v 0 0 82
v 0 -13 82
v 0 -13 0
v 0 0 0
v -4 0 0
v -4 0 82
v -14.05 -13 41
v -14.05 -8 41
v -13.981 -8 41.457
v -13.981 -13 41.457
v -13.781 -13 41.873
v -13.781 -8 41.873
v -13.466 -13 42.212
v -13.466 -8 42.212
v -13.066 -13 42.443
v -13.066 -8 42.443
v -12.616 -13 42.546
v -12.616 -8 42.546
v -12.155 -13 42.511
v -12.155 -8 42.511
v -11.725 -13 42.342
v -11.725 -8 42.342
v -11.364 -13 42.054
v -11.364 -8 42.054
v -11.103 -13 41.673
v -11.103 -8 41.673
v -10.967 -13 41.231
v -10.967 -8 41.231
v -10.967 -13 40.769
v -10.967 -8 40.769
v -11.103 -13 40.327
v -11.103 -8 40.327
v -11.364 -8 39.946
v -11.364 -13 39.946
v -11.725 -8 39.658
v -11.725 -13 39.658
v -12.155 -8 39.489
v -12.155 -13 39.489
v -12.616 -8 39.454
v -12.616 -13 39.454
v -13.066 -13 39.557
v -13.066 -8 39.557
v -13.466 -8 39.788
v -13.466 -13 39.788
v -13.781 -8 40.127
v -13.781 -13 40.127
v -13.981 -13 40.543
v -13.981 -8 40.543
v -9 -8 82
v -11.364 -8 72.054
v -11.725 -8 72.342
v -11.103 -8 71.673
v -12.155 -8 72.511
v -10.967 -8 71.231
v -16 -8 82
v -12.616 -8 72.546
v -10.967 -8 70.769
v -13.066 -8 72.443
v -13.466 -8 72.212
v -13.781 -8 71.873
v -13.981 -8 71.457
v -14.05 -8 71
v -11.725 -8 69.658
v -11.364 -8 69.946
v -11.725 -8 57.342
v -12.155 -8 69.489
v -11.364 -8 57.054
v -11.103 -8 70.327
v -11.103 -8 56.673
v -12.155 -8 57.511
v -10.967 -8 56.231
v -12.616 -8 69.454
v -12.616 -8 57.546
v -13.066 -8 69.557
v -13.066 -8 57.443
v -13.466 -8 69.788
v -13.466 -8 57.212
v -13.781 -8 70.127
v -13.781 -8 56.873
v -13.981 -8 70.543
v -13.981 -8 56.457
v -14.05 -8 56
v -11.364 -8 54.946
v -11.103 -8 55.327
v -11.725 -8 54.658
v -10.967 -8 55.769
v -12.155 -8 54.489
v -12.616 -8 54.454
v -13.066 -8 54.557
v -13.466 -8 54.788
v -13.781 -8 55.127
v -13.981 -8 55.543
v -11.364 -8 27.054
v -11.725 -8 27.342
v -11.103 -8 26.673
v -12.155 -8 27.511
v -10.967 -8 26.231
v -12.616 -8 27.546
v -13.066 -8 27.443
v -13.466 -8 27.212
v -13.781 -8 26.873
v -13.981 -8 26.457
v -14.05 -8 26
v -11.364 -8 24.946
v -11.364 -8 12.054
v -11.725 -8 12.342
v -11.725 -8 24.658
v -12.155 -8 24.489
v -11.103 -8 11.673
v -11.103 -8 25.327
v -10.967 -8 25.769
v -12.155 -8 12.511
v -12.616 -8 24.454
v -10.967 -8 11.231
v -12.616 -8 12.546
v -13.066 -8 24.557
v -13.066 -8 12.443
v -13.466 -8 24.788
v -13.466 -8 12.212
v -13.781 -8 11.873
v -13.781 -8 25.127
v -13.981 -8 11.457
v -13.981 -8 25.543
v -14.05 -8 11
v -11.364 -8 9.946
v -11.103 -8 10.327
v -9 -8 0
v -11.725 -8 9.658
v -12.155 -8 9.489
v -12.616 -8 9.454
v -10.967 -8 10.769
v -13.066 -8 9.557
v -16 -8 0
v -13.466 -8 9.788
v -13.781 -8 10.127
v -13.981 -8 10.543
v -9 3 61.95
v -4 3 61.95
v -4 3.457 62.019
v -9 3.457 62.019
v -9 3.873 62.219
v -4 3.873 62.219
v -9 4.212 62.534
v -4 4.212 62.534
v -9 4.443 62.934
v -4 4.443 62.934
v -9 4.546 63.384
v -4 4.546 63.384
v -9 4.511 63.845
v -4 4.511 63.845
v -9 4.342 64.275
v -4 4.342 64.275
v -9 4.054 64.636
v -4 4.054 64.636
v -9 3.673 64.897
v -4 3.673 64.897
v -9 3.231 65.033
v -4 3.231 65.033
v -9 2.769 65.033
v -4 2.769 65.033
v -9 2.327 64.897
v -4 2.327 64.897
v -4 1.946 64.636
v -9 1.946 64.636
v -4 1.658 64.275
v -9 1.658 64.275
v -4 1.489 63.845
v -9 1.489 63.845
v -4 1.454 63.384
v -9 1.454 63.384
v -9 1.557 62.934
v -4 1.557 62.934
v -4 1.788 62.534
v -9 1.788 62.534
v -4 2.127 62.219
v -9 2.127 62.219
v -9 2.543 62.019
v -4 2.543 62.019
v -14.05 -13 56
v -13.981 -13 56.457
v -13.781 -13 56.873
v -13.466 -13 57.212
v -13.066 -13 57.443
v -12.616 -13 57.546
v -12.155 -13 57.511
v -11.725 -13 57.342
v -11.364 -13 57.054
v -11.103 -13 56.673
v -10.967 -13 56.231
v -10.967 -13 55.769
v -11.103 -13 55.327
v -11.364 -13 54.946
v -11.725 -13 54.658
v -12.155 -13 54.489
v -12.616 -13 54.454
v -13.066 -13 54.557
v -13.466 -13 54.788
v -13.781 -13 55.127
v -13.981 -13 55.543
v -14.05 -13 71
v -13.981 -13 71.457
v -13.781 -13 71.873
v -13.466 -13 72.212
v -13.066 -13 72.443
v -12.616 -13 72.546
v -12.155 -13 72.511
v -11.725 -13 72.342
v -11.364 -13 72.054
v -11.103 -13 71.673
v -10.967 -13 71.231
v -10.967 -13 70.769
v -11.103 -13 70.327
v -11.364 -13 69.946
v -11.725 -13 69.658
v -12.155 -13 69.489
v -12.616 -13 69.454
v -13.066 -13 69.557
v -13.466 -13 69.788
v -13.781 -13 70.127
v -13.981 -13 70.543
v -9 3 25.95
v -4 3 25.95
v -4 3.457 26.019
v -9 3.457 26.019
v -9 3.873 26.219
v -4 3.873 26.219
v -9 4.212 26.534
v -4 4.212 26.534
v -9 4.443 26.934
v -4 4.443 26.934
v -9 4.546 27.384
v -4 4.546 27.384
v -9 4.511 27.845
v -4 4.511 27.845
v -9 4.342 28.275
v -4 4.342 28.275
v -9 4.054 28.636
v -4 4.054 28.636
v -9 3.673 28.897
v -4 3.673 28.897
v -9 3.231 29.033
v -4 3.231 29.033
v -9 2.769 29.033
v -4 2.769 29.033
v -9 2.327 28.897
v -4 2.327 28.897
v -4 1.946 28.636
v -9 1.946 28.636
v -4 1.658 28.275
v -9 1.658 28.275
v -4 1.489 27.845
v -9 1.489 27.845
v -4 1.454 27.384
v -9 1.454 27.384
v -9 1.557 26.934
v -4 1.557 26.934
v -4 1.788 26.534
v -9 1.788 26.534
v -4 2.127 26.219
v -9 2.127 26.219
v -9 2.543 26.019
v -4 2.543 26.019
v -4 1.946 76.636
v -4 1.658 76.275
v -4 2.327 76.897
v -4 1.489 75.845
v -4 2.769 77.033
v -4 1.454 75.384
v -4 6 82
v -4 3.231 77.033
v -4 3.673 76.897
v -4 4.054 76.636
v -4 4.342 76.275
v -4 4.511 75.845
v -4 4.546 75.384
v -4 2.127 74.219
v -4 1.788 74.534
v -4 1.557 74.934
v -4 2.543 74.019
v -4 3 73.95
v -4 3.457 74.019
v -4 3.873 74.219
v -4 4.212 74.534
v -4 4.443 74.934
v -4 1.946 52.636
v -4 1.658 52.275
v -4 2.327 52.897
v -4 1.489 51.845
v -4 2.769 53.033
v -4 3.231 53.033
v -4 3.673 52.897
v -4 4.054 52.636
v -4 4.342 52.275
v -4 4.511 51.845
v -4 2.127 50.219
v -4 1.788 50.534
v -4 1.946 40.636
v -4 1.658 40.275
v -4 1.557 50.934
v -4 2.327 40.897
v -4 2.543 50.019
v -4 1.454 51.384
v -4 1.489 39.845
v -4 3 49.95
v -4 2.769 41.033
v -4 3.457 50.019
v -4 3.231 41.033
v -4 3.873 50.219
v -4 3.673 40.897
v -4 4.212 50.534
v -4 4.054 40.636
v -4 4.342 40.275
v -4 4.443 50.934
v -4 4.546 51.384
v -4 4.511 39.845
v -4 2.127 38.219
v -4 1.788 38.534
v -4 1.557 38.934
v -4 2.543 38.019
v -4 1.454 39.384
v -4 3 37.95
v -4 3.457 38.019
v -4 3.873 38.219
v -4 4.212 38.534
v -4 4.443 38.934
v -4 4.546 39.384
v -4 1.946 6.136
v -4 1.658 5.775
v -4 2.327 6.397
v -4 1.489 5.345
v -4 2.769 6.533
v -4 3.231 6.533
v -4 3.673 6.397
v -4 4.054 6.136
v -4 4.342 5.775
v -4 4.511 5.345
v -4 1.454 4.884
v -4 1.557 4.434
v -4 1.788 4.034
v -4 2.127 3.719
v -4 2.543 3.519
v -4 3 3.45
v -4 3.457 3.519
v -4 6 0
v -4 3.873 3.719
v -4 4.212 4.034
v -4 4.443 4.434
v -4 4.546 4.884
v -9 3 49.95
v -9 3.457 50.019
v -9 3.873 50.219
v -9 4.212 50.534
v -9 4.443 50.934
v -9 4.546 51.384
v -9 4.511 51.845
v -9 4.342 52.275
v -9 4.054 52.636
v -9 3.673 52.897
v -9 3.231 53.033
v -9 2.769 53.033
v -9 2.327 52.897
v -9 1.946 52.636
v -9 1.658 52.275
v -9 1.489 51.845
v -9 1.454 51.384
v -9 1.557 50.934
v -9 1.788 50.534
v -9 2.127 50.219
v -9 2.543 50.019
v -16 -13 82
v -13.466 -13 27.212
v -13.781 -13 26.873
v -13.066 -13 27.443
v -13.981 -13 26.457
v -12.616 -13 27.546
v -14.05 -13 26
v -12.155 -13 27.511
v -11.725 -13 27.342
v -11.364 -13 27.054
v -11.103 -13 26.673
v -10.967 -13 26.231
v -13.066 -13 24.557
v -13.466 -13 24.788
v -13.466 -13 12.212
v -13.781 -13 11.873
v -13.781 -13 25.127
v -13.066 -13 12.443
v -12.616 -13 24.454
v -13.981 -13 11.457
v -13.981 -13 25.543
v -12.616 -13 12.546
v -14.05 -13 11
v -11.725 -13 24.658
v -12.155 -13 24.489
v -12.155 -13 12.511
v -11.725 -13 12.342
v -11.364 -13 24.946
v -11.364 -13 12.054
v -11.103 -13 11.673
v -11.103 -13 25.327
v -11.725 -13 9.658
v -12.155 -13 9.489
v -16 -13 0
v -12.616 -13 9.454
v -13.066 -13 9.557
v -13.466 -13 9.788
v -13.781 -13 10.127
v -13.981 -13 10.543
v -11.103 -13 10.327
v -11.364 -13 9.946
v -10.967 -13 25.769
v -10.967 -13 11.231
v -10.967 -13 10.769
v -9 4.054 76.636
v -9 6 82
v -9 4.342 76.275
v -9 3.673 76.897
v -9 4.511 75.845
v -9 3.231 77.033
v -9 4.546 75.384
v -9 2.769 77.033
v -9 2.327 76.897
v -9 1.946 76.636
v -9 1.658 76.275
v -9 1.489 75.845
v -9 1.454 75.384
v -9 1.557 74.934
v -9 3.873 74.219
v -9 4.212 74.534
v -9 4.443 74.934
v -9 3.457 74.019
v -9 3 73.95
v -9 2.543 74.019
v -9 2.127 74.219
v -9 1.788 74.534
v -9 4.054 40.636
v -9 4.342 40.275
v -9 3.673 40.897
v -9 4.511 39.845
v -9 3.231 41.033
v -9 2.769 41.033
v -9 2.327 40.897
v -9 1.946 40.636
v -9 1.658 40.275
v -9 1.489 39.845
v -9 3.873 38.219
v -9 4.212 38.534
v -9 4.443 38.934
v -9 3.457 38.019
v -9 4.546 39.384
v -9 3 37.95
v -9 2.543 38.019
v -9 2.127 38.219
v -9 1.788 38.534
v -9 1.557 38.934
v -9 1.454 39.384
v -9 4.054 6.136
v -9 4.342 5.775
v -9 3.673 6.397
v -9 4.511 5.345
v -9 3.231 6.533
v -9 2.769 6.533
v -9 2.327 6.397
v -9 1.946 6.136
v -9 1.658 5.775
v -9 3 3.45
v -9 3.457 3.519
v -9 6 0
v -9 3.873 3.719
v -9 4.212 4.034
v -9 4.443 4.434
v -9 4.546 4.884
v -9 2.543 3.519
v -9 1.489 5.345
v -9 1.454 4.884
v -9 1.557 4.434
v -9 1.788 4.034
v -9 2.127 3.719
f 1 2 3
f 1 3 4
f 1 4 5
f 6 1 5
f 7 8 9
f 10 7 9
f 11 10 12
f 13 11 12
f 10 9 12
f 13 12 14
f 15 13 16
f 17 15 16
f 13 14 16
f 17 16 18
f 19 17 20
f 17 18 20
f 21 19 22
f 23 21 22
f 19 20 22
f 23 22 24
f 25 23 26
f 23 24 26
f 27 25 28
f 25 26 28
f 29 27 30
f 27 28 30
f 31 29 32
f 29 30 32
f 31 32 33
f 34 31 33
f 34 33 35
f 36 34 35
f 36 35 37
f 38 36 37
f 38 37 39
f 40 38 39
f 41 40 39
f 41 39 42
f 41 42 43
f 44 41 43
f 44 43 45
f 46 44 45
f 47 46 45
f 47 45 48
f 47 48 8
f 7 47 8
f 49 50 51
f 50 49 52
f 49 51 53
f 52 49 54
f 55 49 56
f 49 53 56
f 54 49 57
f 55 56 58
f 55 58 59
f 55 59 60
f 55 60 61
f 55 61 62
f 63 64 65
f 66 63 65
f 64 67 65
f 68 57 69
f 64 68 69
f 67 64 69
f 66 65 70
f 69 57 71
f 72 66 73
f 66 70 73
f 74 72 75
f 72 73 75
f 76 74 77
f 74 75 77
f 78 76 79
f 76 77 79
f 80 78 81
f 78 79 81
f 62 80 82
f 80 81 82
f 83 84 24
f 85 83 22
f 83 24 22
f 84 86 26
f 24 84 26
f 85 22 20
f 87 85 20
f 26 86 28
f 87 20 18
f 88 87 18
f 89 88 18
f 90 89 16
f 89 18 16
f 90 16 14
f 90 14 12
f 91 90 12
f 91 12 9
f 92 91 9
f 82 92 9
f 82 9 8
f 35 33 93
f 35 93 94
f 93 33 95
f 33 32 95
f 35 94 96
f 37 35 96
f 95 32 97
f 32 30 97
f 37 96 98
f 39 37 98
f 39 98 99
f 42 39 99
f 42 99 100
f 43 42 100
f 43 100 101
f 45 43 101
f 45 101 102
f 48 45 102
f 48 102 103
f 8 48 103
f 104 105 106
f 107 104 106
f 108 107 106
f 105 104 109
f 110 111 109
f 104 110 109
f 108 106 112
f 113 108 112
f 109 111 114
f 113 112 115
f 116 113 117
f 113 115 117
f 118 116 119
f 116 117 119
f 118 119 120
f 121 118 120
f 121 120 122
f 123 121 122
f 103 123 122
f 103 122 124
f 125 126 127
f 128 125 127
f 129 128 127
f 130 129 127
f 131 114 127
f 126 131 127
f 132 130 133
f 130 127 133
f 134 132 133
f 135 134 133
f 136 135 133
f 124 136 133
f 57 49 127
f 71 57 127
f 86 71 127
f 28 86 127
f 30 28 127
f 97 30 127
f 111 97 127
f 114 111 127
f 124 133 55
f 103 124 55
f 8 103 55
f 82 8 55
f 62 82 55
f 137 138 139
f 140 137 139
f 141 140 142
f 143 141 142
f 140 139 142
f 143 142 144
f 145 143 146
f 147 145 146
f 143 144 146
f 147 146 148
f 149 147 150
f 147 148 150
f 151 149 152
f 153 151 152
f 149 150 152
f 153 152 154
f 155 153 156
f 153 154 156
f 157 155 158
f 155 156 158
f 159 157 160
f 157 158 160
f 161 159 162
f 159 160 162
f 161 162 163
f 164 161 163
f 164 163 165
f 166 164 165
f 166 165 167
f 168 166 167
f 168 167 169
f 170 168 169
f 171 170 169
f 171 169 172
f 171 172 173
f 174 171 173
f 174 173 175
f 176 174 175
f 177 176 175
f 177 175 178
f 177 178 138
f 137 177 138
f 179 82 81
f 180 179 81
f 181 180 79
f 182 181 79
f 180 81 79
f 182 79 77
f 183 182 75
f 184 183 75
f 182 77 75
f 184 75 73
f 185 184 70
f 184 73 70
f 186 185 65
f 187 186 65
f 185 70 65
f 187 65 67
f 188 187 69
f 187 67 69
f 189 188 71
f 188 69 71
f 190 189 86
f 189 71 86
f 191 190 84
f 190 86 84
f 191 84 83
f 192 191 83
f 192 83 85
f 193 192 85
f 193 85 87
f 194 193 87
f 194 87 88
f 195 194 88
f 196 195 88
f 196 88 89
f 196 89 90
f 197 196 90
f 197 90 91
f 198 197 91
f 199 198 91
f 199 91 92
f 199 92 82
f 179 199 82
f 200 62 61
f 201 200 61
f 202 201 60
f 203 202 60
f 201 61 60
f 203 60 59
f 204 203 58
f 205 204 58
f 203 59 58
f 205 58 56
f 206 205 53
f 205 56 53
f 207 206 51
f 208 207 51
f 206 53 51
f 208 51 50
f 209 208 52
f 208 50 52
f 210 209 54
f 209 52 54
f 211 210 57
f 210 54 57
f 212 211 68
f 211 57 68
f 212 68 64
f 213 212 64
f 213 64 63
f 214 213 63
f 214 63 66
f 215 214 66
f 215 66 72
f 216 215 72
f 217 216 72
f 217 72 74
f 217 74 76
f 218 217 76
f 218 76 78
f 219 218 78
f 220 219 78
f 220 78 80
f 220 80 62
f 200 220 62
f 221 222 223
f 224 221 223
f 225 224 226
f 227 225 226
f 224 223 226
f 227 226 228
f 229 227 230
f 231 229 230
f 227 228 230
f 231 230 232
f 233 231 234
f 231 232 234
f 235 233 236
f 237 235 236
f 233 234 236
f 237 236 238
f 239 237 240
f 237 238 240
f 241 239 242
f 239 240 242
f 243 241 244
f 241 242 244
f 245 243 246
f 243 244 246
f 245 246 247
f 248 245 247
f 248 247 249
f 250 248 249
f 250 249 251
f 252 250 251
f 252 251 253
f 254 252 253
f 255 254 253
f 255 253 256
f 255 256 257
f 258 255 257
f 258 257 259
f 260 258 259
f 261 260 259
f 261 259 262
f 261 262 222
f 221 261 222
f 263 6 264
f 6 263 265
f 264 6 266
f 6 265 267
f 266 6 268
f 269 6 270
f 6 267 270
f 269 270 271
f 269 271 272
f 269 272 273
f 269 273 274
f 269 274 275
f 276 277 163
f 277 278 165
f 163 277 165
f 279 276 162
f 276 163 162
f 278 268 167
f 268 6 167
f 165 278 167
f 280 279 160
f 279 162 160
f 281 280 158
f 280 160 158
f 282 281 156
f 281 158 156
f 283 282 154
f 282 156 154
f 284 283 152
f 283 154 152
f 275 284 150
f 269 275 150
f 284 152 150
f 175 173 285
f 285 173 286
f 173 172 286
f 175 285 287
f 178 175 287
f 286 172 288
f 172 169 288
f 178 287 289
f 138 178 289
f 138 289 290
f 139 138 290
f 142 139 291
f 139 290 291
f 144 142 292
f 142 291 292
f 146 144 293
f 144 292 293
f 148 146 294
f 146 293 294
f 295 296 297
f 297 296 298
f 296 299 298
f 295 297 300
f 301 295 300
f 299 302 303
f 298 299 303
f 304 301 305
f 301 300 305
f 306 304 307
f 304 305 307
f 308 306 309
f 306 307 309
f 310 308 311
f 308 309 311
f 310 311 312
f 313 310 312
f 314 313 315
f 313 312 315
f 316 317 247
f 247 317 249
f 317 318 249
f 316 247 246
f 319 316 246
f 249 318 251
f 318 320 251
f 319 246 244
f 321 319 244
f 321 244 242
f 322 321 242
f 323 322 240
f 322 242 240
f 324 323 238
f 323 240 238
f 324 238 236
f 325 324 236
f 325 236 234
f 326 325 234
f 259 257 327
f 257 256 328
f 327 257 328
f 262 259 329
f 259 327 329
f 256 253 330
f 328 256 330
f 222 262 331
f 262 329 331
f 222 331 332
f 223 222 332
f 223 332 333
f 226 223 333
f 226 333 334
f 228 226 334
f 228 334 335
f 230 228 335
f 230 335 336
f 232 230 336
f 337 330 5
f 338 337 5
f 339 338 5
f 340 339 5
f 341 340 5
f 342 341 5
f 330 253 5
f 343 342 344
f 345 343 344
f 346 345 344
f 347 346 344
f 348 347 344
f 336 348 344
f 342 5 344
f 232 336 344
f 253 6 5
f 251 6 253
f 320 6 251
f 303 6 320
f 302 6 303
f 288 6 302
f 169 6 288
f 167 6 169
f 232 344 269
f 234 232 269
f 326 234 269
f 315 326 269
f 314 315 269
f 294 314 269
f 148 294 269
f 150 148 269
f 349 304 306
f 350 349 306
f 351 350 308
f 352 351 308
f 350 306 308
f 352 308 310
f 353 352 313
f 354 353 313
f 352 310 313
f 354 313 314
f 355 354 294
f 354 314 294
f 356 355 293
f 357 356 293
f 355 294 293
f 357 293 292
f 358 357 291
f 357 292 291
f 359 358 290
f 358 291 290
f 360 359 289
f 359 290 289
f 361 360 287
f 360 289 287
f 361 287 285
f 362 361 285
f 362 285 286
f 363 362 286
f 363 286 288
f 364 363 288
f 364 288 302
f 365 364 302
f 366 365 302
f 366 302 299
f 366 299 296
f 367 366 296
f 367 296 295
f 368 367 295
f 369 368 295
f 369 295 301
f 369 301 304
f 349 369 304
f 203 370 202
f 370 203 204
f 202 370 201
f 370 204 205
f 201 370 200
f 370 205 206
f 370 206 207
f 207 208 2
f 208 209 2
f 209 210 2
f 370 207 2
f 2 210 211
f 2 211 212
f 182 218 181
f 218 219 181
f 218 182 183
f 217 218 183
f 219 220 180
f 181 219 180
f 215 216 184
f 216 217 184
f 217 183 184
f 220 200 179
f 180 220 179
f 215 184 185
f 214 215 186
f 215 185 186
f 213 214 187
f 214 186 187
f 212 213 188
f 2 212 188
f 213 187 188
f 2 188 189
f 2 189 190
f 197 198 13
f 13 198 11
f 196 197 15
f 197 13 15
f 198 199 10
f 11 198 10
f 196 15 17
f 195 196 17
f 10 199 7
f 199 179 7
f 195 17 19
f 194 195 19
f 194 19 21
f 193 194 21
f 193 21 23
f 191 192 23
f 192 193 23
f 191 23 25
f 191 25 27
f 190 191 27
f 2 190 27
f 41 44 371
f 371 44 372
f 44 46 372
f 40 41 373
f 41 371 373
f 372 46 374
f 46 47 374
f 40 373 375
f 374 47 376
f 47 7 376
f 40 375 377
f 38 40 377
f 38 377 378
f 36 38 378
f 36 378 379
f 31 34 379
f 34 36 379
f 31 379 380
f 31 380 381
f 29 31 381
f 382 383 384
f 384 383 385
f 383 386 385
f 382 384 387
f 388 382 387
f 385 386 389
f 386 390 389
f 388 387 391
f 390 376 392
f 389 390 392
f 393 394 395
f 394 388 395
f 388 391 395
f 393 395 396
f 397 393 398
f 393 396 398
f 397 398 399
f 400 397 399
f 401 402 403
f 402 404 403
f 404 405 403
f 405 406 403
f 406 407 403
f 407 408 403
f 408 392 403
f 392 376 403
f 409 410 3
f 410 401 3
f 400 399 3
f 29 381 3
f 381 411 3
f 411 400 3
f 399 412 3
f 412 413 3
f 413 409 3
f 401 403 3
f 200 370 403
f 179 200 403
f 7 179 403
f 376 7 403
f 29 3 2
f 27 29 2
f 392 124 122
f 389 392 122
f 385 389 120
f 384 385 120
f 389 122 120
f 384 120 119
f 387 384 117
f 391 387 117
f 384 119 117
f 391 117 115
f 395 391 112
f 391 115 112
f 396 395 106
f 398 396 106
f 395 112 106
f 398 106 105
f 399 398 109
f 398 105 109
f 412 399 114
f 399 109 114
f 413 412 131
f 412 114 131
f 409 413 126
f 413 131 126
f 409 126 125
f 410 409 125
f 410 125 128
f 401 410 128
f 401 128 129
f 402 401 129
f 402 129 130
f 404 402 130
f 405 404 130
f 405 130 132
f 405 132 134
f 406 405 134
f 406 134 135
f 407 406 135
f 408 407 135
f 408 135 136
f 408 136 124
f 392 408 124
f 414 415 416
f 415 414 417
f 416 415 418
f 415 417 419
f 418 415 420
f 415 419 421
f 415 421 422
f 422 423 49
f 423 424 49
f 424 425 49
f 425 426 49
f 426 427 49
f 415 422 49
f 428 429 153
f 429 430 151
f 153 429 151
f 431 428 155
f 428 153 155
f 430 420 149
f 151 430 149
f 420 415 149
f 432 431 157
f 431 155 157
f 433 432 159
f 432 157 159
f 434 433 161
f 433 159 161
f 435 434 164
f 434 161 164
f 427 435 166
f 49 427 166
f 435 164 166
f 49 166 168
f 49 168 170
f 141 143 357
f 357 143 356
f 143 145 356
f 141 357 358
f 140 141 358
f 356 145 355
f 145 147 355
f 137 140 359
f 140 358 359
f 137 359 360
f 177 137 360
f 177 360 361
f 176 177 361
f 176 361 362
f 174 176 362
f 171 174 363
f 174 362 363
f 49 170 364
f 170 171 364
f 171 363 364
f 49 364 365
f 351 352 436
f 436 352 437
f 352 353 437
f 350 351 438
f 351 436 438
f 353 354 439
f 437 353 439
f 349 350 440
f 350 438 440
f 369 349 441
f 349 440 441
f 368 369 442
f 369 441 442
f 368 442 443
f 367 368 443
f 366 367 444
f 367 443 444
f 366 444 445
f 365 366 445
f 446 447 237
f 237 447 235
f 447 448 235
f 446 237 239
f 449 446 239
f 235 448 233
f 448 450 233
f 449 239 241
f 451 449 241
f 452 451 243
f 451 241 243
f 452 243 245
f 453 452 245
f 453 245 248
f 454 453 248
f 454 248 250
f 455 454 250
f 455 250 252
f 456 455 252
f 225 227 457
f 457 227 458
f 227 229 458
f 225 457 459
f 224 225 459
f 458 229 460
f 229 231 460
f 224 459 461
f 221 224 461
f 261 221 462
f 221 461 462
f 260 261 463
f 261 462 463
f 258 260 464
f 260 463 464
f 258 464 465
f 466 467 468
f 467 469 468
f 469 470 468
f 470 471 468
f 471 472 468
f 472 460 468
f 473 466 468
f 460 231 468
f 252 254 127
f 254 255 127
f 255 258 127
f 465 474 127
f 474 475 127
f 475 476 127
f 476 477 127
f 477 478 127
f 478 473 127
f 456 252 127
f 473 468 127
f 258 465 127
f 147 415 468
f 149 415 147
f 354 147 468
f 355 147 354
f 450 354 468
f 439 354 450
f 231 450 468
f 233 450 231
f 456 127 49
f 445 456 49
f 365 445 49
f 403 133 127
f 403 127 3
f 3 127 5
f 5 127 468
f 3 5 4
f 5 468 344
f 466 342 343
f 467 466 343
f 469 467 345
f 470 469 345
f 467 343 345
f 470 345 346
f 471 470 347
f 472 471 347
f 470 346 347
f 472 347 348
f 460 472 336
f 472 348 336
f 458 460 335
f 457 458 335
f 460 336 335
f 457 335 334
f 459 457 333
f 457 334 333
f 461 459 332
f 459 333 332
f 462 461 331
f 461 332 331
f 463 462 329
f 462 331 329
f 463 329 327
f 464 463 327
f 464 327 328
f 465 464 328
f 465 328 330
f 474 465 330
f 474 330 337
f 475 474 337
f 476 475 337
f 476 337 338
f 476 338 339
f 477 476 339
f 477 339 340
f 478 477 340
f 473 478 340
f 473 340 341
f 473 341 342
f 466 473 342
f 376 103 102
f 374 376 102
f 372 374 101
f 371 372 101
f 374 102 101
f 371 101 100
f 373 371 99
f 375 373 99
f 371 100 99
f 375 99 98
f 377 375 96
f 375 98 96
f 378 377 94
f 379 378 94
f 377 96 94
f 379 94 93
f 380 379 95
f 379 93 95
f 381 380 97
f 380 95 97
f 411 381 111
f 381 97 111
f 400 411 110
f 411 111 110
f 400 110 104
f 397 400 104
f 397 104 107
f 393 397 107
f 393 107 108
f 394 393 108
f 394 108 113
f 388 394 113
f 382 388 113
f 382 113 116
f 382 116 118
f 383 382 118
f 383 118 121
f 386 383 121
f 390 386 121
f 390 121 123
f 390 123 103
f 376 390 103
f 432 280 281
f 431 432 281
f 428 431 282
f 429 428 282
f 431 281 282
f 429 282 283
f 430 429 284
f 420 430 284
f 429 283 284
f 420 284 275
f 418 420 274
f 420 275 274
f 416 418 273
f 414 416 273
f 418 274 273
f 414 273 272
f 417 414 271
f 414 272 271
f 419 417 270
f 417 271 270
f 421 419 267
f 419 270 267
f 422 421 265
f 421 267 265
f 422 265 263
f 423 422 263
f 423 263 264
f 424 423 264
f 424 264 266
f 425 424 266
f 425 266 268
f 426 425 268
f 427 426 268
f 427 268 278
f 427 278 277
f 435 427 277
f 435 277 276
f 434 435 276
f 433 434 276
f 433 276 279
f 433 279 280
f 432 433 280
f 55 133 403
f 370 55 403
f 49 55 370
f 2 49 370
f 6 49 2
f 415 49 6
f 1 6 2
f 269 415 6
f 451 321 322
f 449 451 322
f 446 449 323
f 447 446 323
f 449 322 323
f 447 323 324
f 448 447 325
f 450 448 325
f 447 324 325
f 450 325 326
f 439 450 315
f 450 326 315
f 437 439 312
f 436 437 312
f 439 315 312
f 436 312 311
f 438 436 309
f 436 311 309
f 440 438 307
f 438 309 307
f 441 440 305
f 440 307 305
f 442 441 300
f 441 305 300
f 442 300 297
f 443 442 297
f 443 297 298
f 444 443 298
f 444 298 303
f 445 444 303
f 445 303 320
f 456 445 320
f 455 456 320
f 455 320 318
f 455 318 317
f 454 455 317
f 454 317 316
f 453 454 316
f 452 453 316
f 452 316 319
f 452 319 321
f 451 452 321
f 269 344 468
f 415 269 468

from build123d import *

# Parameters (mm, degrees)
EXTRUDE_1_DEPTH        = 82
SKETCH_2_R             = 1.55
CUT_EXTRUDE_1_DEPTH    = 84.886828525
SKETCH_3_R             = 1.55
CUT_EXTRUDE_2_DEPTH    = 85.711274338
PATTERN_LINEAR_1_COUNT = 5
PATTERN_LINEAR_1_PITCH = 15


with BuildPart() as part:
    # 草圖1 → 填料-伸長1 (new body)
    with BuildSketch(Plane.XY):
        Polygon((-9, 6), (-9, -8), (-16, -8), (-16, -13), (0, -13), (0, 0), (-4, 0), (-4, 6), align=None)
    extrude(amount=EXTRUDE_1_DEPTH)

    # 草圖2 → 除料-伸長1 (cut, through all)
    with BuildSketch(Plane(origin=(-4, 0, 0), x_dir=(0, 0, -1), z_dir=(1, 0, 0))):
        with Locations((-75.5, 3)):
            Circle(SKETCH_2_R)
        with Locations((-63.5, 3)):
            Circle(SKETCH_2_R)
        with Locations((-51.5, 3)):
            Circle(SKETCH_2_R)
        with Locations((-39.5, 3)):
            Circle(SKETCH_2_R)
        with Locations((-27.5, 3)):
            Circle(SKETCH_2_R)
        with Locations((-5, 3)):
            Circle(SKETCH_2_R)
    extrude(amount=-CUT_EXTRUDE_1_DEPTH, mode=Mode.SUBTRACT)

    # 草圖3 → 除料-伸長2 (cut, through all)
    with BuildSketch(Plane(origin=(0, -8, 0), x_dir=(1, 0, 0), z_dir=(0, 1, 0))):
        with Locations(Location((-12.5, -11, 0), (0, 0, 180))):
            Circle(SKETCH_3_R)
    cut_extrude_2 = extrude(amount=-CUT_EXTRUDE_2_DEPTH, mode=Mode.SUBTRACT)

    # 直線複製排列1: 除料-伸長2 ×5
    with Locations(*[(0, 0, i * PATTERN_LINEAR_1_PITCH) for i in range(1, PATTERN_LINEAR_1_COUNT)]):
        add(cut_extrude_2, mode=Mode.SUBTRACT)


solid = part.part
